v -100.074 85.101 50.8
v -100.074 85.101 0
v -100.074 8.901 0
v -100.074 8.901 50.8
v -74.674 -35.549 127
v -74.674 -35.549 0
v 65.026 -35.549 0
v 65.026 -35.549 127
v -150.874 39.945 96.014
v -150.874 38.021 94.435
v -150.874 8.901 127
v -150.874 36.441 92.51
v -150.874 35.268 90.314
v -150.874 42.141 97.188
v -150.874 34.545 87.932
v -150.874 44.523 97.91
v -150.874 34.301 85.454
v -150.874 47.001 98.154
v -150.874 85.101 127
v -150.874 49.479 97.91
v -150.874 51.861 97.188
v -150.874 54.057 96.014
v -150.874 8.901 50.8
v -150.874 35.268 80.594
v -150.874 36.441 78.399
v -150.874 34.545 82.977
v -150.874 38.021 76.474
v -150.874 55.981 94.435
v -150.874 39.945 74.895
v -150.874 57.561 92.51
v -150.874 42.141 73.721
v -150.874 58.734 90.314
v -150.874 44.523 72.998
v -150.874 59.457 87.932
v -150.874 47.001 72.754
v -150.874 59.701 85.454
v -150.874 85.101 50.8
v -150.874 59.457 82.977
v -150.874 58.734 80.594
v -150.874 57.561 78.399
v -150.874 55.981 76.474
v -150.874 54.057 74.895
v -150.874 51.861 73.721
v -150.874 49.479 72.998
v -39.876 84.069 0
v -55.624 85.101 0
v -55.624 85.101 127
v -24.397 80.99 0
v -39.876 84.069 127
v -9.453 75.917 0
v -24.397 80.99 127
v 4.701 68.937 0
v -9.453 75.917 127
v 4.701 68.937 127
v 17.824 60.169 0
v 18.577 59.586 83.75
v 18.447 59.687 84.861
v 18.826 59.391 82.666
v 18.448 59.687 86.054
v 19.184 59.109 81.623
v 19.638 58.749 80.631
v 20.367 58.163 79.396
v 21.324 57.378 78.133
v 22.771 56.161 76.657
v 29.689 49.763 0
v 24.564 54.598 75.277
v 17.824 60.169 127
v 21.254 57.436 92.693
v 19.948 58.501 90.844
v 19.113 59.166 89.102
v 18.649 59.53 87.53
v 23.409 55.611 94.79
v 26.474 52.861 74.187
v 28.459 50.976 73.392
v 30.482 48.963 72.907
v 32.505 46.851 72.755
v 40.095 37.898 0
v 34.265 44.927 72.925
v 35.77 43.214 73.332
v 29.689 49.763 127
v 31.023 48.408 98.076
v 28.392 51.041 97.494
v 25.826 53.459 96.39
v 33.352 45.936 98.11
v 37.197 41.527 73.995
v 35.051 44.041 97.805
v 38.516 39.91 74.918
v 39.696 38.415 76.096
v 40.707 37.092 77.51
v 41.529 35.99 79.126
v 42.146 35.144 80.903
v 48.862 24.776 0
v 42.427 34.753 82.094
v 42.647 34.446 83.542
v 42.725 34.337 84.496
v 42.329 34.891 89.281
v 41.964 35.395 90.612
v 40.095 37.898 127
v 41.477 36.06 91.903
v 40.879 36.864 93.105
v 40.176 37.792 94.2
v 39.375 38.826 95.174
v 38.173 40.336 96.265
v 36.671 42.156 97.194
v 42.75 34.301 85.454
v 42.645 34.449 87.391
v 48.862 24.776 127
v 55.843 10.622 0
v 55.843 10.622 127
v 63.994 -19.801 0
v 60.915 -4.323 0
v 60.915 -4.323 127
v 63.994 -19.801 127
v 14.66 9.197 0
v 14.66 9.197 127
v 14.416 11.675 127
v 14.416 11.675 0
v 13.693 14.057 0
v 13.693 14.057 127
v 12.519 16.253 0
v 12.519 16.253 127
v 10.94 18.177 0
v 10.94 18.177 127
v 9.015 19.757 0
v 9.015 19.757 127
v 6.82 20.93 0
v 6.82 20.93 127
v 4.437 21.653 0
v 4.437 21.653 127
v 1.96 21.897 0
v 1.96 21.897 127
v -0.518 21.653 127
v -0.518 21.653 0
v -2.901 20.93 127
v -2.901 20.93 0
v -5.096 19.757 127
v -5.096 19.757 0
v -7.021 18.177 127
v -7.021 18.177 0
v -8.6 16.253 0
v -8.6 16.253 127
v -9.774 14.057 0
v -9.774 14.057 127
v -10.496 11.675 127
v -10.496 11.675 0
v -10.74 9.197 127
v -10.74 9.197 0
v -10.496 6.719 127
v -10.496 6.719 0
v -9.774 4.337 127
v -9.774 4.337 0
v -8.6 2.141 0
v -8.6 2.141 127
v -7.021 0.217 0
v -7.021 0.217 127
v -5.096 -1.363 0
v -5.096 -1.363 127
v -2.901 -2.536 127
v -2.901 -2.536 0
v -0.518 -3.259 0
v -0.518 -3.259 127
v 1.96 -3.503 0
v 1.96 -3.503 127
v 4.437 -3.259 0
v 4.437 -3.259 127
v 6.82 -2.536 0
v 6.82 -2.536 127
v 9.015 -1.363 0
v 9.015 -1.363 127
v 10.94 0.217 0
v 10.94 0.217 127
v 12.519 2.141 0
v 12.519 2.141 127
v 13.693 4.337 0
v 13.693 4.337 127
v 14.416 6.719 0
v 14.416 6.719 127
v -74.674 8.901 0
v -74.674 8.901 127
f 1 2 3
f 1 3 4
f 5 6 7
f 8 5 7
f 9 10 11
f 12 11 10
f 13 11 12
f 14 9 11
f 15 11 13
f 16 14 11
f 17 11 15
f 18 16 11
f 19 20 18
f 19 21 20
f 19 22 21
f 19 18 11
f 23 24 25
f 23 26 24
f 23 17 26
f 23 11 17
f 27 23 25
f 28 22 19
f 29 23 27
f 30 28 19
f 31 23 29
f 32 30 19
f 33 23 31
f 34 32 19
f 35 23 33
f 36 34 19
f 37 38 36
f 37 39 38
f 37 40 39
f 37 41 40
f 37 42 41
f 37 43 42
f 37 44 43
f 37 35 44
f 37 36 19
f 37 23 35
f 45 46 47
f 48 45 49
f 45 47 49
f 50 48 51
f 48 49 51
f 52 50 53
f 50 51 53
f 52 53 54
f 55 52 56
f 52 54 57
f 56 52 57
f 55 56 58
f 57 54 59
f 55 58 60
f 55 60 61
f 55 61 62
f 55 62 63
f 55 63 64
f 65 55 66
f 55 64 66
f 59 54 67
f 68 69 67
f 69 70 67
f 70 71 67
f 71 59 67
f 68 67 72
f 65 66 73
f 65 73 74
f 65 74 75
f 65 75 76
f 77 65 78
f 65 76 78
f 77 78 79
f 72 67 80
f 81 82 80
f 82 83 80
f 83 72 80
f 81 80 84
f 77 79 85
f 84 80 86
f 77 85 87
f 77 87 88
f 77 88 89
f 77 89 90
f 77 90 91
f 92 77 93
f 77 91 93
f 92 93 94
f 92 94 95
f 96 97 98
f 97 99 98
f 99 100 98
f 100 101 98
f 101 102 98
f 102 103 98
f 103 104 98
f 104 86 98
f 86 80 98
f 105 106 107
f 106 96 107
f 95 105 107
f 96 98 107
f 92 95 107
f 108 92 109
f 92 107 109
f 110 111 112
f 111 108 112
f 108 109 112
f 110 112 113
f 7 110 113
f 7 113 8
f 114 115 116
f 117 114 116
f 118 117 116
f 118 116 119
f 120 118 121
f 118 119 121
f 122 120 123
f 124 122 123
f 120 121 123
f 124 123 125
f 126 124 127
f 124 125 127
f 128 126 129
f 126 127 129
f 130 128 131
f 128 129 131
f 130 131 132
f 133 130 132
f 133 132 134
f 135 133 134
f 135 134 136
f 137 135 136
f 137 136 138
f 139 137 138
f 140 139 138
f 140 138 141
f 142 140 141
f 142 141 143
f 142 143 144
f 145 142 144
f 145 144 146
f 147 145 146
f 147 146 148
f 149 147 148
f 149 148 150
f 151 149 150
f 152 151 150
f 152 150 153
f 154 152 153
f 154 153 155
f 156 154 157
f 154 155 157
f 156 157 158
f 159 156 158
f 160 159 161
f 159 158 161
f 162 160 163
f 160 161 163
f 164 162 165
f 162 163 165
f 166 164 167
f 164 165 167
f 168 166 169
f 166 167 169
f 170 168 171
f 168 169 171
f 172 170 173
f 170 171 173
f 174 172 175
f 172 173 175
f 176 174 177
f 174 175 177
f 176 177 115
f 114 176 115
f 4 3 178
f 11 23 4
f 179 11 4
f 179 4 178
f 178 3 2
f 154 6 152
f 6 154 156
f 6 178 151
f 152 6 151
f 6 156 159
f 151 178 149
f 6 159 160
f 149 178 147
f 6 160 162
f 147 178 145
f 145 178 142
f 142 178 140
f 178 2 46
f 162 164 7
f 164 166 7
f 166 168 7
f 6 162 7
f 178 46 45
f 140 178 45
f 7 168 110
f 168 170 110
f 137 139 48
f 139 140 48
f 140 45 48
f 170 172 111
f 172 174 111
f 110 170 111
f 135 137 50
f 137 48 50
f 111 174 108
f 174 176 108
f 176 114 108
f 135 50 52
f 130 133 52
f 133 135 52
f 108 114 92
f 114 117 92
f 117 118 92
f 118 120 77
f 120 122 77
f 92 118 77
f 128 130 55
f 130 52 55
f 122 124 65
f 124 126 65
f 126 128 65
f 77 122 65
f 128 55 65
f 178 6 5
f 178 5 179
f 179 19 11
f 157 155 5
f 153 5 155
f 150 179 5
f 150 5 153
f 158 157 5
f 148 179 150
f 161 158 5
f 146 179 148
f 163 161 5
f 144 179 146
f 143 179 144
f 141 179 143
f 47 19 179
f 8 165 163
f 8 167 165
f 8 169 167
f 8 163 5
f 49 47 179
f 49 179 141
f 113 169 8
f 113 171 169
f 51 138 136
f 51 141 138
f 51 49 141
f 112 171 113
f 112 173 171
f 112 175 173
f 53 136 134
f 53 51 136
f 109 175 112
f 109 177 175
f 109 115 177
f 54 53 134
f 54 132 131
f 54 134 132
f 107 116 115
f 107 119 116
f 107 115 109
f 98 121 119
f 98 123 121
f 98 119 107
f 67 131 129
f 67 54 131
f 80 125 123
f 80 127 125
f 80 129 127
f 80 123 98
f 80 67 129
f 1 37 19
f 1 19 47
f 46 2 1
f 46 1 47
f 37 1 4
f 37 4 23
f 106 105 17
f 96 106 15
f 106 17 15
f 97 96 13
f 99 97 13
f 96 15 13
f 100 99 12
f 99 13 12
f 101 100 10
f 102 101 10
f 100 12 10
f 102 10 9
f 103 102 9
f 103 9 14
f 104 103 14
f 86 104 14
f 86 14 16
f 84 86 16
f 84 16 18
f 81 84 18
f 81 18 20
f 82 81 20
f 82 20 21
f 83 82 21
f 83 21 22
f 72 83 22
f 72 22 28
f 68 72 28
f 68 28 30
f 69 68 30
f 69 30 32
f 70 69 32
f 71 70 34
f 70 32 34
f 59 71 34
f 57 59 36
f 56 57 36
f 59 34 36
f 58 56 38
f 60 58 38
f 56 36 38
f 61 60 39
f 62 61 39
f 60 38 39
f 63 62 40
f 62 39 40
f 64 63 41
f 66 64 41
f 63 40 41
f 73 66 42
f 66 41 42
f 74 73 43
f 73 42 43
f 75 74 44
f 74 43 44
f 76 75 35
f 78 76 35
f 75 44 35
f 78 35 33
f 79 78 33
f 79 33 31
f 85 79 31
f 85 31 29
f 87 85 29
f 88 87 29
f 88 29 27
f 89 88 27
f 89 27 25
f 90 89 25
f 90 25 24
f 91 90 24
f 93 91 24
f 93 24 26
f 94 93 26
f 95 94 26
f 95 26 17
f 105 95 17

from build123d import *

# Parameters (mm, degrees)
F0_W      = 215.9
F0_H      = 120.65
F1_DEPTH  = 127
F2_W      = 76.2
F2_H      = 44.45
F3_DEPTH  = 25.4
F3_FACE_W = 76.2
F3_FACE_H = 44.45
F4_DEPTH  = 101.601
F6_DEPTH  = 127.001
F7_W      = 50.8
F7_H      = 50.8
F8_DEPTH  = 120.651
F9_R      = 12.7
F10_DEPTH = 215.901
F12_R     = 12.7
F13_DEPTH = 127.001


with BuildPart() as f1:
    # F0 (on Top) → F1 (new body)
    with BuildSketch(Plane.XY):
        with Locations((-42.923508, 24.775881)):
            Rectangle(F0_W, F0_H)
    extrude(amount=F1_DEPTH)

    # F2 (on face) → F3 (cut)
    with BuildSketch(Plane.XY.offset(127)):
        with Locations((-112.773508, -13.324119)):
            Rectangle(F2_W, F2_H)
    extrude(amount=-F3_DEPTH, mode=Mode.SUBTRACT)

    # F3_face (on face) → F4 (cut, through all)
    with BuildSketch(Plane(origin=(-112.773508, -13.324119, 101.6), x_dir=(1, 0, 0), z_dir=(0, 0, 1))):
        Rectangle(F3_FACE_W, F3_FACE_H)
    extrude(amount=-F4_DEPTH, mode=Mode.SUBTRACT)

    # F5 (on face) → F6 (cut, through all)
    with BuildSketch(Plane.XY.offset(127)):
        with BuildLine():
            ThreePointArc((-55.623508, 85.100881), (29.688925, 49.763314), (65.026492, -35.549119))
            Line((65.026492, -35.549119), (65.026492, 85.100881))
            Line((65.026492, 85.100881), (-55.623508, 85.100881))
        make_face()
    extrude(amount=-F6_DEPTH, mode=Mode.SUBTRACT)

    # F7 (on face) → F8 (cut, through all)
    with BuildSketch(Plane(origin=(0, 85.100881, 0), x_dir=(-1, 0, 0), z_dir=(0, 1, 0))):
        with Locations((125.473508, 25.4)):
            Rectangle(F7_W, F7_H)
    extrude(amount=-F8_DEPTH, mode=Mode.SUBTRACT)

    # F9 (on face) → F10 (cut, through all)
    with BuildSketch(Plane(origin=(-150.873508, 0, 0), x_dir=(0, -1, 0), z_dir=(-1, 0, 0))):
        with Locations((-47.000881, 85.454322)):
            Circle(F9_R)
    extrude(amount=-F10_DEPTH, mode=Mode.SUBTRACT)

    # F12 (on face) → F13 (cut, through all)
    with BuildSketch(Plane.XY.offset(127)):
        with Locations((1.959576, 9.196907)):
            Circle(F12_R)
    extrude(amount=-F13_DEPTH, mode=Mode.SUBTRACT)


solid = f1.part
